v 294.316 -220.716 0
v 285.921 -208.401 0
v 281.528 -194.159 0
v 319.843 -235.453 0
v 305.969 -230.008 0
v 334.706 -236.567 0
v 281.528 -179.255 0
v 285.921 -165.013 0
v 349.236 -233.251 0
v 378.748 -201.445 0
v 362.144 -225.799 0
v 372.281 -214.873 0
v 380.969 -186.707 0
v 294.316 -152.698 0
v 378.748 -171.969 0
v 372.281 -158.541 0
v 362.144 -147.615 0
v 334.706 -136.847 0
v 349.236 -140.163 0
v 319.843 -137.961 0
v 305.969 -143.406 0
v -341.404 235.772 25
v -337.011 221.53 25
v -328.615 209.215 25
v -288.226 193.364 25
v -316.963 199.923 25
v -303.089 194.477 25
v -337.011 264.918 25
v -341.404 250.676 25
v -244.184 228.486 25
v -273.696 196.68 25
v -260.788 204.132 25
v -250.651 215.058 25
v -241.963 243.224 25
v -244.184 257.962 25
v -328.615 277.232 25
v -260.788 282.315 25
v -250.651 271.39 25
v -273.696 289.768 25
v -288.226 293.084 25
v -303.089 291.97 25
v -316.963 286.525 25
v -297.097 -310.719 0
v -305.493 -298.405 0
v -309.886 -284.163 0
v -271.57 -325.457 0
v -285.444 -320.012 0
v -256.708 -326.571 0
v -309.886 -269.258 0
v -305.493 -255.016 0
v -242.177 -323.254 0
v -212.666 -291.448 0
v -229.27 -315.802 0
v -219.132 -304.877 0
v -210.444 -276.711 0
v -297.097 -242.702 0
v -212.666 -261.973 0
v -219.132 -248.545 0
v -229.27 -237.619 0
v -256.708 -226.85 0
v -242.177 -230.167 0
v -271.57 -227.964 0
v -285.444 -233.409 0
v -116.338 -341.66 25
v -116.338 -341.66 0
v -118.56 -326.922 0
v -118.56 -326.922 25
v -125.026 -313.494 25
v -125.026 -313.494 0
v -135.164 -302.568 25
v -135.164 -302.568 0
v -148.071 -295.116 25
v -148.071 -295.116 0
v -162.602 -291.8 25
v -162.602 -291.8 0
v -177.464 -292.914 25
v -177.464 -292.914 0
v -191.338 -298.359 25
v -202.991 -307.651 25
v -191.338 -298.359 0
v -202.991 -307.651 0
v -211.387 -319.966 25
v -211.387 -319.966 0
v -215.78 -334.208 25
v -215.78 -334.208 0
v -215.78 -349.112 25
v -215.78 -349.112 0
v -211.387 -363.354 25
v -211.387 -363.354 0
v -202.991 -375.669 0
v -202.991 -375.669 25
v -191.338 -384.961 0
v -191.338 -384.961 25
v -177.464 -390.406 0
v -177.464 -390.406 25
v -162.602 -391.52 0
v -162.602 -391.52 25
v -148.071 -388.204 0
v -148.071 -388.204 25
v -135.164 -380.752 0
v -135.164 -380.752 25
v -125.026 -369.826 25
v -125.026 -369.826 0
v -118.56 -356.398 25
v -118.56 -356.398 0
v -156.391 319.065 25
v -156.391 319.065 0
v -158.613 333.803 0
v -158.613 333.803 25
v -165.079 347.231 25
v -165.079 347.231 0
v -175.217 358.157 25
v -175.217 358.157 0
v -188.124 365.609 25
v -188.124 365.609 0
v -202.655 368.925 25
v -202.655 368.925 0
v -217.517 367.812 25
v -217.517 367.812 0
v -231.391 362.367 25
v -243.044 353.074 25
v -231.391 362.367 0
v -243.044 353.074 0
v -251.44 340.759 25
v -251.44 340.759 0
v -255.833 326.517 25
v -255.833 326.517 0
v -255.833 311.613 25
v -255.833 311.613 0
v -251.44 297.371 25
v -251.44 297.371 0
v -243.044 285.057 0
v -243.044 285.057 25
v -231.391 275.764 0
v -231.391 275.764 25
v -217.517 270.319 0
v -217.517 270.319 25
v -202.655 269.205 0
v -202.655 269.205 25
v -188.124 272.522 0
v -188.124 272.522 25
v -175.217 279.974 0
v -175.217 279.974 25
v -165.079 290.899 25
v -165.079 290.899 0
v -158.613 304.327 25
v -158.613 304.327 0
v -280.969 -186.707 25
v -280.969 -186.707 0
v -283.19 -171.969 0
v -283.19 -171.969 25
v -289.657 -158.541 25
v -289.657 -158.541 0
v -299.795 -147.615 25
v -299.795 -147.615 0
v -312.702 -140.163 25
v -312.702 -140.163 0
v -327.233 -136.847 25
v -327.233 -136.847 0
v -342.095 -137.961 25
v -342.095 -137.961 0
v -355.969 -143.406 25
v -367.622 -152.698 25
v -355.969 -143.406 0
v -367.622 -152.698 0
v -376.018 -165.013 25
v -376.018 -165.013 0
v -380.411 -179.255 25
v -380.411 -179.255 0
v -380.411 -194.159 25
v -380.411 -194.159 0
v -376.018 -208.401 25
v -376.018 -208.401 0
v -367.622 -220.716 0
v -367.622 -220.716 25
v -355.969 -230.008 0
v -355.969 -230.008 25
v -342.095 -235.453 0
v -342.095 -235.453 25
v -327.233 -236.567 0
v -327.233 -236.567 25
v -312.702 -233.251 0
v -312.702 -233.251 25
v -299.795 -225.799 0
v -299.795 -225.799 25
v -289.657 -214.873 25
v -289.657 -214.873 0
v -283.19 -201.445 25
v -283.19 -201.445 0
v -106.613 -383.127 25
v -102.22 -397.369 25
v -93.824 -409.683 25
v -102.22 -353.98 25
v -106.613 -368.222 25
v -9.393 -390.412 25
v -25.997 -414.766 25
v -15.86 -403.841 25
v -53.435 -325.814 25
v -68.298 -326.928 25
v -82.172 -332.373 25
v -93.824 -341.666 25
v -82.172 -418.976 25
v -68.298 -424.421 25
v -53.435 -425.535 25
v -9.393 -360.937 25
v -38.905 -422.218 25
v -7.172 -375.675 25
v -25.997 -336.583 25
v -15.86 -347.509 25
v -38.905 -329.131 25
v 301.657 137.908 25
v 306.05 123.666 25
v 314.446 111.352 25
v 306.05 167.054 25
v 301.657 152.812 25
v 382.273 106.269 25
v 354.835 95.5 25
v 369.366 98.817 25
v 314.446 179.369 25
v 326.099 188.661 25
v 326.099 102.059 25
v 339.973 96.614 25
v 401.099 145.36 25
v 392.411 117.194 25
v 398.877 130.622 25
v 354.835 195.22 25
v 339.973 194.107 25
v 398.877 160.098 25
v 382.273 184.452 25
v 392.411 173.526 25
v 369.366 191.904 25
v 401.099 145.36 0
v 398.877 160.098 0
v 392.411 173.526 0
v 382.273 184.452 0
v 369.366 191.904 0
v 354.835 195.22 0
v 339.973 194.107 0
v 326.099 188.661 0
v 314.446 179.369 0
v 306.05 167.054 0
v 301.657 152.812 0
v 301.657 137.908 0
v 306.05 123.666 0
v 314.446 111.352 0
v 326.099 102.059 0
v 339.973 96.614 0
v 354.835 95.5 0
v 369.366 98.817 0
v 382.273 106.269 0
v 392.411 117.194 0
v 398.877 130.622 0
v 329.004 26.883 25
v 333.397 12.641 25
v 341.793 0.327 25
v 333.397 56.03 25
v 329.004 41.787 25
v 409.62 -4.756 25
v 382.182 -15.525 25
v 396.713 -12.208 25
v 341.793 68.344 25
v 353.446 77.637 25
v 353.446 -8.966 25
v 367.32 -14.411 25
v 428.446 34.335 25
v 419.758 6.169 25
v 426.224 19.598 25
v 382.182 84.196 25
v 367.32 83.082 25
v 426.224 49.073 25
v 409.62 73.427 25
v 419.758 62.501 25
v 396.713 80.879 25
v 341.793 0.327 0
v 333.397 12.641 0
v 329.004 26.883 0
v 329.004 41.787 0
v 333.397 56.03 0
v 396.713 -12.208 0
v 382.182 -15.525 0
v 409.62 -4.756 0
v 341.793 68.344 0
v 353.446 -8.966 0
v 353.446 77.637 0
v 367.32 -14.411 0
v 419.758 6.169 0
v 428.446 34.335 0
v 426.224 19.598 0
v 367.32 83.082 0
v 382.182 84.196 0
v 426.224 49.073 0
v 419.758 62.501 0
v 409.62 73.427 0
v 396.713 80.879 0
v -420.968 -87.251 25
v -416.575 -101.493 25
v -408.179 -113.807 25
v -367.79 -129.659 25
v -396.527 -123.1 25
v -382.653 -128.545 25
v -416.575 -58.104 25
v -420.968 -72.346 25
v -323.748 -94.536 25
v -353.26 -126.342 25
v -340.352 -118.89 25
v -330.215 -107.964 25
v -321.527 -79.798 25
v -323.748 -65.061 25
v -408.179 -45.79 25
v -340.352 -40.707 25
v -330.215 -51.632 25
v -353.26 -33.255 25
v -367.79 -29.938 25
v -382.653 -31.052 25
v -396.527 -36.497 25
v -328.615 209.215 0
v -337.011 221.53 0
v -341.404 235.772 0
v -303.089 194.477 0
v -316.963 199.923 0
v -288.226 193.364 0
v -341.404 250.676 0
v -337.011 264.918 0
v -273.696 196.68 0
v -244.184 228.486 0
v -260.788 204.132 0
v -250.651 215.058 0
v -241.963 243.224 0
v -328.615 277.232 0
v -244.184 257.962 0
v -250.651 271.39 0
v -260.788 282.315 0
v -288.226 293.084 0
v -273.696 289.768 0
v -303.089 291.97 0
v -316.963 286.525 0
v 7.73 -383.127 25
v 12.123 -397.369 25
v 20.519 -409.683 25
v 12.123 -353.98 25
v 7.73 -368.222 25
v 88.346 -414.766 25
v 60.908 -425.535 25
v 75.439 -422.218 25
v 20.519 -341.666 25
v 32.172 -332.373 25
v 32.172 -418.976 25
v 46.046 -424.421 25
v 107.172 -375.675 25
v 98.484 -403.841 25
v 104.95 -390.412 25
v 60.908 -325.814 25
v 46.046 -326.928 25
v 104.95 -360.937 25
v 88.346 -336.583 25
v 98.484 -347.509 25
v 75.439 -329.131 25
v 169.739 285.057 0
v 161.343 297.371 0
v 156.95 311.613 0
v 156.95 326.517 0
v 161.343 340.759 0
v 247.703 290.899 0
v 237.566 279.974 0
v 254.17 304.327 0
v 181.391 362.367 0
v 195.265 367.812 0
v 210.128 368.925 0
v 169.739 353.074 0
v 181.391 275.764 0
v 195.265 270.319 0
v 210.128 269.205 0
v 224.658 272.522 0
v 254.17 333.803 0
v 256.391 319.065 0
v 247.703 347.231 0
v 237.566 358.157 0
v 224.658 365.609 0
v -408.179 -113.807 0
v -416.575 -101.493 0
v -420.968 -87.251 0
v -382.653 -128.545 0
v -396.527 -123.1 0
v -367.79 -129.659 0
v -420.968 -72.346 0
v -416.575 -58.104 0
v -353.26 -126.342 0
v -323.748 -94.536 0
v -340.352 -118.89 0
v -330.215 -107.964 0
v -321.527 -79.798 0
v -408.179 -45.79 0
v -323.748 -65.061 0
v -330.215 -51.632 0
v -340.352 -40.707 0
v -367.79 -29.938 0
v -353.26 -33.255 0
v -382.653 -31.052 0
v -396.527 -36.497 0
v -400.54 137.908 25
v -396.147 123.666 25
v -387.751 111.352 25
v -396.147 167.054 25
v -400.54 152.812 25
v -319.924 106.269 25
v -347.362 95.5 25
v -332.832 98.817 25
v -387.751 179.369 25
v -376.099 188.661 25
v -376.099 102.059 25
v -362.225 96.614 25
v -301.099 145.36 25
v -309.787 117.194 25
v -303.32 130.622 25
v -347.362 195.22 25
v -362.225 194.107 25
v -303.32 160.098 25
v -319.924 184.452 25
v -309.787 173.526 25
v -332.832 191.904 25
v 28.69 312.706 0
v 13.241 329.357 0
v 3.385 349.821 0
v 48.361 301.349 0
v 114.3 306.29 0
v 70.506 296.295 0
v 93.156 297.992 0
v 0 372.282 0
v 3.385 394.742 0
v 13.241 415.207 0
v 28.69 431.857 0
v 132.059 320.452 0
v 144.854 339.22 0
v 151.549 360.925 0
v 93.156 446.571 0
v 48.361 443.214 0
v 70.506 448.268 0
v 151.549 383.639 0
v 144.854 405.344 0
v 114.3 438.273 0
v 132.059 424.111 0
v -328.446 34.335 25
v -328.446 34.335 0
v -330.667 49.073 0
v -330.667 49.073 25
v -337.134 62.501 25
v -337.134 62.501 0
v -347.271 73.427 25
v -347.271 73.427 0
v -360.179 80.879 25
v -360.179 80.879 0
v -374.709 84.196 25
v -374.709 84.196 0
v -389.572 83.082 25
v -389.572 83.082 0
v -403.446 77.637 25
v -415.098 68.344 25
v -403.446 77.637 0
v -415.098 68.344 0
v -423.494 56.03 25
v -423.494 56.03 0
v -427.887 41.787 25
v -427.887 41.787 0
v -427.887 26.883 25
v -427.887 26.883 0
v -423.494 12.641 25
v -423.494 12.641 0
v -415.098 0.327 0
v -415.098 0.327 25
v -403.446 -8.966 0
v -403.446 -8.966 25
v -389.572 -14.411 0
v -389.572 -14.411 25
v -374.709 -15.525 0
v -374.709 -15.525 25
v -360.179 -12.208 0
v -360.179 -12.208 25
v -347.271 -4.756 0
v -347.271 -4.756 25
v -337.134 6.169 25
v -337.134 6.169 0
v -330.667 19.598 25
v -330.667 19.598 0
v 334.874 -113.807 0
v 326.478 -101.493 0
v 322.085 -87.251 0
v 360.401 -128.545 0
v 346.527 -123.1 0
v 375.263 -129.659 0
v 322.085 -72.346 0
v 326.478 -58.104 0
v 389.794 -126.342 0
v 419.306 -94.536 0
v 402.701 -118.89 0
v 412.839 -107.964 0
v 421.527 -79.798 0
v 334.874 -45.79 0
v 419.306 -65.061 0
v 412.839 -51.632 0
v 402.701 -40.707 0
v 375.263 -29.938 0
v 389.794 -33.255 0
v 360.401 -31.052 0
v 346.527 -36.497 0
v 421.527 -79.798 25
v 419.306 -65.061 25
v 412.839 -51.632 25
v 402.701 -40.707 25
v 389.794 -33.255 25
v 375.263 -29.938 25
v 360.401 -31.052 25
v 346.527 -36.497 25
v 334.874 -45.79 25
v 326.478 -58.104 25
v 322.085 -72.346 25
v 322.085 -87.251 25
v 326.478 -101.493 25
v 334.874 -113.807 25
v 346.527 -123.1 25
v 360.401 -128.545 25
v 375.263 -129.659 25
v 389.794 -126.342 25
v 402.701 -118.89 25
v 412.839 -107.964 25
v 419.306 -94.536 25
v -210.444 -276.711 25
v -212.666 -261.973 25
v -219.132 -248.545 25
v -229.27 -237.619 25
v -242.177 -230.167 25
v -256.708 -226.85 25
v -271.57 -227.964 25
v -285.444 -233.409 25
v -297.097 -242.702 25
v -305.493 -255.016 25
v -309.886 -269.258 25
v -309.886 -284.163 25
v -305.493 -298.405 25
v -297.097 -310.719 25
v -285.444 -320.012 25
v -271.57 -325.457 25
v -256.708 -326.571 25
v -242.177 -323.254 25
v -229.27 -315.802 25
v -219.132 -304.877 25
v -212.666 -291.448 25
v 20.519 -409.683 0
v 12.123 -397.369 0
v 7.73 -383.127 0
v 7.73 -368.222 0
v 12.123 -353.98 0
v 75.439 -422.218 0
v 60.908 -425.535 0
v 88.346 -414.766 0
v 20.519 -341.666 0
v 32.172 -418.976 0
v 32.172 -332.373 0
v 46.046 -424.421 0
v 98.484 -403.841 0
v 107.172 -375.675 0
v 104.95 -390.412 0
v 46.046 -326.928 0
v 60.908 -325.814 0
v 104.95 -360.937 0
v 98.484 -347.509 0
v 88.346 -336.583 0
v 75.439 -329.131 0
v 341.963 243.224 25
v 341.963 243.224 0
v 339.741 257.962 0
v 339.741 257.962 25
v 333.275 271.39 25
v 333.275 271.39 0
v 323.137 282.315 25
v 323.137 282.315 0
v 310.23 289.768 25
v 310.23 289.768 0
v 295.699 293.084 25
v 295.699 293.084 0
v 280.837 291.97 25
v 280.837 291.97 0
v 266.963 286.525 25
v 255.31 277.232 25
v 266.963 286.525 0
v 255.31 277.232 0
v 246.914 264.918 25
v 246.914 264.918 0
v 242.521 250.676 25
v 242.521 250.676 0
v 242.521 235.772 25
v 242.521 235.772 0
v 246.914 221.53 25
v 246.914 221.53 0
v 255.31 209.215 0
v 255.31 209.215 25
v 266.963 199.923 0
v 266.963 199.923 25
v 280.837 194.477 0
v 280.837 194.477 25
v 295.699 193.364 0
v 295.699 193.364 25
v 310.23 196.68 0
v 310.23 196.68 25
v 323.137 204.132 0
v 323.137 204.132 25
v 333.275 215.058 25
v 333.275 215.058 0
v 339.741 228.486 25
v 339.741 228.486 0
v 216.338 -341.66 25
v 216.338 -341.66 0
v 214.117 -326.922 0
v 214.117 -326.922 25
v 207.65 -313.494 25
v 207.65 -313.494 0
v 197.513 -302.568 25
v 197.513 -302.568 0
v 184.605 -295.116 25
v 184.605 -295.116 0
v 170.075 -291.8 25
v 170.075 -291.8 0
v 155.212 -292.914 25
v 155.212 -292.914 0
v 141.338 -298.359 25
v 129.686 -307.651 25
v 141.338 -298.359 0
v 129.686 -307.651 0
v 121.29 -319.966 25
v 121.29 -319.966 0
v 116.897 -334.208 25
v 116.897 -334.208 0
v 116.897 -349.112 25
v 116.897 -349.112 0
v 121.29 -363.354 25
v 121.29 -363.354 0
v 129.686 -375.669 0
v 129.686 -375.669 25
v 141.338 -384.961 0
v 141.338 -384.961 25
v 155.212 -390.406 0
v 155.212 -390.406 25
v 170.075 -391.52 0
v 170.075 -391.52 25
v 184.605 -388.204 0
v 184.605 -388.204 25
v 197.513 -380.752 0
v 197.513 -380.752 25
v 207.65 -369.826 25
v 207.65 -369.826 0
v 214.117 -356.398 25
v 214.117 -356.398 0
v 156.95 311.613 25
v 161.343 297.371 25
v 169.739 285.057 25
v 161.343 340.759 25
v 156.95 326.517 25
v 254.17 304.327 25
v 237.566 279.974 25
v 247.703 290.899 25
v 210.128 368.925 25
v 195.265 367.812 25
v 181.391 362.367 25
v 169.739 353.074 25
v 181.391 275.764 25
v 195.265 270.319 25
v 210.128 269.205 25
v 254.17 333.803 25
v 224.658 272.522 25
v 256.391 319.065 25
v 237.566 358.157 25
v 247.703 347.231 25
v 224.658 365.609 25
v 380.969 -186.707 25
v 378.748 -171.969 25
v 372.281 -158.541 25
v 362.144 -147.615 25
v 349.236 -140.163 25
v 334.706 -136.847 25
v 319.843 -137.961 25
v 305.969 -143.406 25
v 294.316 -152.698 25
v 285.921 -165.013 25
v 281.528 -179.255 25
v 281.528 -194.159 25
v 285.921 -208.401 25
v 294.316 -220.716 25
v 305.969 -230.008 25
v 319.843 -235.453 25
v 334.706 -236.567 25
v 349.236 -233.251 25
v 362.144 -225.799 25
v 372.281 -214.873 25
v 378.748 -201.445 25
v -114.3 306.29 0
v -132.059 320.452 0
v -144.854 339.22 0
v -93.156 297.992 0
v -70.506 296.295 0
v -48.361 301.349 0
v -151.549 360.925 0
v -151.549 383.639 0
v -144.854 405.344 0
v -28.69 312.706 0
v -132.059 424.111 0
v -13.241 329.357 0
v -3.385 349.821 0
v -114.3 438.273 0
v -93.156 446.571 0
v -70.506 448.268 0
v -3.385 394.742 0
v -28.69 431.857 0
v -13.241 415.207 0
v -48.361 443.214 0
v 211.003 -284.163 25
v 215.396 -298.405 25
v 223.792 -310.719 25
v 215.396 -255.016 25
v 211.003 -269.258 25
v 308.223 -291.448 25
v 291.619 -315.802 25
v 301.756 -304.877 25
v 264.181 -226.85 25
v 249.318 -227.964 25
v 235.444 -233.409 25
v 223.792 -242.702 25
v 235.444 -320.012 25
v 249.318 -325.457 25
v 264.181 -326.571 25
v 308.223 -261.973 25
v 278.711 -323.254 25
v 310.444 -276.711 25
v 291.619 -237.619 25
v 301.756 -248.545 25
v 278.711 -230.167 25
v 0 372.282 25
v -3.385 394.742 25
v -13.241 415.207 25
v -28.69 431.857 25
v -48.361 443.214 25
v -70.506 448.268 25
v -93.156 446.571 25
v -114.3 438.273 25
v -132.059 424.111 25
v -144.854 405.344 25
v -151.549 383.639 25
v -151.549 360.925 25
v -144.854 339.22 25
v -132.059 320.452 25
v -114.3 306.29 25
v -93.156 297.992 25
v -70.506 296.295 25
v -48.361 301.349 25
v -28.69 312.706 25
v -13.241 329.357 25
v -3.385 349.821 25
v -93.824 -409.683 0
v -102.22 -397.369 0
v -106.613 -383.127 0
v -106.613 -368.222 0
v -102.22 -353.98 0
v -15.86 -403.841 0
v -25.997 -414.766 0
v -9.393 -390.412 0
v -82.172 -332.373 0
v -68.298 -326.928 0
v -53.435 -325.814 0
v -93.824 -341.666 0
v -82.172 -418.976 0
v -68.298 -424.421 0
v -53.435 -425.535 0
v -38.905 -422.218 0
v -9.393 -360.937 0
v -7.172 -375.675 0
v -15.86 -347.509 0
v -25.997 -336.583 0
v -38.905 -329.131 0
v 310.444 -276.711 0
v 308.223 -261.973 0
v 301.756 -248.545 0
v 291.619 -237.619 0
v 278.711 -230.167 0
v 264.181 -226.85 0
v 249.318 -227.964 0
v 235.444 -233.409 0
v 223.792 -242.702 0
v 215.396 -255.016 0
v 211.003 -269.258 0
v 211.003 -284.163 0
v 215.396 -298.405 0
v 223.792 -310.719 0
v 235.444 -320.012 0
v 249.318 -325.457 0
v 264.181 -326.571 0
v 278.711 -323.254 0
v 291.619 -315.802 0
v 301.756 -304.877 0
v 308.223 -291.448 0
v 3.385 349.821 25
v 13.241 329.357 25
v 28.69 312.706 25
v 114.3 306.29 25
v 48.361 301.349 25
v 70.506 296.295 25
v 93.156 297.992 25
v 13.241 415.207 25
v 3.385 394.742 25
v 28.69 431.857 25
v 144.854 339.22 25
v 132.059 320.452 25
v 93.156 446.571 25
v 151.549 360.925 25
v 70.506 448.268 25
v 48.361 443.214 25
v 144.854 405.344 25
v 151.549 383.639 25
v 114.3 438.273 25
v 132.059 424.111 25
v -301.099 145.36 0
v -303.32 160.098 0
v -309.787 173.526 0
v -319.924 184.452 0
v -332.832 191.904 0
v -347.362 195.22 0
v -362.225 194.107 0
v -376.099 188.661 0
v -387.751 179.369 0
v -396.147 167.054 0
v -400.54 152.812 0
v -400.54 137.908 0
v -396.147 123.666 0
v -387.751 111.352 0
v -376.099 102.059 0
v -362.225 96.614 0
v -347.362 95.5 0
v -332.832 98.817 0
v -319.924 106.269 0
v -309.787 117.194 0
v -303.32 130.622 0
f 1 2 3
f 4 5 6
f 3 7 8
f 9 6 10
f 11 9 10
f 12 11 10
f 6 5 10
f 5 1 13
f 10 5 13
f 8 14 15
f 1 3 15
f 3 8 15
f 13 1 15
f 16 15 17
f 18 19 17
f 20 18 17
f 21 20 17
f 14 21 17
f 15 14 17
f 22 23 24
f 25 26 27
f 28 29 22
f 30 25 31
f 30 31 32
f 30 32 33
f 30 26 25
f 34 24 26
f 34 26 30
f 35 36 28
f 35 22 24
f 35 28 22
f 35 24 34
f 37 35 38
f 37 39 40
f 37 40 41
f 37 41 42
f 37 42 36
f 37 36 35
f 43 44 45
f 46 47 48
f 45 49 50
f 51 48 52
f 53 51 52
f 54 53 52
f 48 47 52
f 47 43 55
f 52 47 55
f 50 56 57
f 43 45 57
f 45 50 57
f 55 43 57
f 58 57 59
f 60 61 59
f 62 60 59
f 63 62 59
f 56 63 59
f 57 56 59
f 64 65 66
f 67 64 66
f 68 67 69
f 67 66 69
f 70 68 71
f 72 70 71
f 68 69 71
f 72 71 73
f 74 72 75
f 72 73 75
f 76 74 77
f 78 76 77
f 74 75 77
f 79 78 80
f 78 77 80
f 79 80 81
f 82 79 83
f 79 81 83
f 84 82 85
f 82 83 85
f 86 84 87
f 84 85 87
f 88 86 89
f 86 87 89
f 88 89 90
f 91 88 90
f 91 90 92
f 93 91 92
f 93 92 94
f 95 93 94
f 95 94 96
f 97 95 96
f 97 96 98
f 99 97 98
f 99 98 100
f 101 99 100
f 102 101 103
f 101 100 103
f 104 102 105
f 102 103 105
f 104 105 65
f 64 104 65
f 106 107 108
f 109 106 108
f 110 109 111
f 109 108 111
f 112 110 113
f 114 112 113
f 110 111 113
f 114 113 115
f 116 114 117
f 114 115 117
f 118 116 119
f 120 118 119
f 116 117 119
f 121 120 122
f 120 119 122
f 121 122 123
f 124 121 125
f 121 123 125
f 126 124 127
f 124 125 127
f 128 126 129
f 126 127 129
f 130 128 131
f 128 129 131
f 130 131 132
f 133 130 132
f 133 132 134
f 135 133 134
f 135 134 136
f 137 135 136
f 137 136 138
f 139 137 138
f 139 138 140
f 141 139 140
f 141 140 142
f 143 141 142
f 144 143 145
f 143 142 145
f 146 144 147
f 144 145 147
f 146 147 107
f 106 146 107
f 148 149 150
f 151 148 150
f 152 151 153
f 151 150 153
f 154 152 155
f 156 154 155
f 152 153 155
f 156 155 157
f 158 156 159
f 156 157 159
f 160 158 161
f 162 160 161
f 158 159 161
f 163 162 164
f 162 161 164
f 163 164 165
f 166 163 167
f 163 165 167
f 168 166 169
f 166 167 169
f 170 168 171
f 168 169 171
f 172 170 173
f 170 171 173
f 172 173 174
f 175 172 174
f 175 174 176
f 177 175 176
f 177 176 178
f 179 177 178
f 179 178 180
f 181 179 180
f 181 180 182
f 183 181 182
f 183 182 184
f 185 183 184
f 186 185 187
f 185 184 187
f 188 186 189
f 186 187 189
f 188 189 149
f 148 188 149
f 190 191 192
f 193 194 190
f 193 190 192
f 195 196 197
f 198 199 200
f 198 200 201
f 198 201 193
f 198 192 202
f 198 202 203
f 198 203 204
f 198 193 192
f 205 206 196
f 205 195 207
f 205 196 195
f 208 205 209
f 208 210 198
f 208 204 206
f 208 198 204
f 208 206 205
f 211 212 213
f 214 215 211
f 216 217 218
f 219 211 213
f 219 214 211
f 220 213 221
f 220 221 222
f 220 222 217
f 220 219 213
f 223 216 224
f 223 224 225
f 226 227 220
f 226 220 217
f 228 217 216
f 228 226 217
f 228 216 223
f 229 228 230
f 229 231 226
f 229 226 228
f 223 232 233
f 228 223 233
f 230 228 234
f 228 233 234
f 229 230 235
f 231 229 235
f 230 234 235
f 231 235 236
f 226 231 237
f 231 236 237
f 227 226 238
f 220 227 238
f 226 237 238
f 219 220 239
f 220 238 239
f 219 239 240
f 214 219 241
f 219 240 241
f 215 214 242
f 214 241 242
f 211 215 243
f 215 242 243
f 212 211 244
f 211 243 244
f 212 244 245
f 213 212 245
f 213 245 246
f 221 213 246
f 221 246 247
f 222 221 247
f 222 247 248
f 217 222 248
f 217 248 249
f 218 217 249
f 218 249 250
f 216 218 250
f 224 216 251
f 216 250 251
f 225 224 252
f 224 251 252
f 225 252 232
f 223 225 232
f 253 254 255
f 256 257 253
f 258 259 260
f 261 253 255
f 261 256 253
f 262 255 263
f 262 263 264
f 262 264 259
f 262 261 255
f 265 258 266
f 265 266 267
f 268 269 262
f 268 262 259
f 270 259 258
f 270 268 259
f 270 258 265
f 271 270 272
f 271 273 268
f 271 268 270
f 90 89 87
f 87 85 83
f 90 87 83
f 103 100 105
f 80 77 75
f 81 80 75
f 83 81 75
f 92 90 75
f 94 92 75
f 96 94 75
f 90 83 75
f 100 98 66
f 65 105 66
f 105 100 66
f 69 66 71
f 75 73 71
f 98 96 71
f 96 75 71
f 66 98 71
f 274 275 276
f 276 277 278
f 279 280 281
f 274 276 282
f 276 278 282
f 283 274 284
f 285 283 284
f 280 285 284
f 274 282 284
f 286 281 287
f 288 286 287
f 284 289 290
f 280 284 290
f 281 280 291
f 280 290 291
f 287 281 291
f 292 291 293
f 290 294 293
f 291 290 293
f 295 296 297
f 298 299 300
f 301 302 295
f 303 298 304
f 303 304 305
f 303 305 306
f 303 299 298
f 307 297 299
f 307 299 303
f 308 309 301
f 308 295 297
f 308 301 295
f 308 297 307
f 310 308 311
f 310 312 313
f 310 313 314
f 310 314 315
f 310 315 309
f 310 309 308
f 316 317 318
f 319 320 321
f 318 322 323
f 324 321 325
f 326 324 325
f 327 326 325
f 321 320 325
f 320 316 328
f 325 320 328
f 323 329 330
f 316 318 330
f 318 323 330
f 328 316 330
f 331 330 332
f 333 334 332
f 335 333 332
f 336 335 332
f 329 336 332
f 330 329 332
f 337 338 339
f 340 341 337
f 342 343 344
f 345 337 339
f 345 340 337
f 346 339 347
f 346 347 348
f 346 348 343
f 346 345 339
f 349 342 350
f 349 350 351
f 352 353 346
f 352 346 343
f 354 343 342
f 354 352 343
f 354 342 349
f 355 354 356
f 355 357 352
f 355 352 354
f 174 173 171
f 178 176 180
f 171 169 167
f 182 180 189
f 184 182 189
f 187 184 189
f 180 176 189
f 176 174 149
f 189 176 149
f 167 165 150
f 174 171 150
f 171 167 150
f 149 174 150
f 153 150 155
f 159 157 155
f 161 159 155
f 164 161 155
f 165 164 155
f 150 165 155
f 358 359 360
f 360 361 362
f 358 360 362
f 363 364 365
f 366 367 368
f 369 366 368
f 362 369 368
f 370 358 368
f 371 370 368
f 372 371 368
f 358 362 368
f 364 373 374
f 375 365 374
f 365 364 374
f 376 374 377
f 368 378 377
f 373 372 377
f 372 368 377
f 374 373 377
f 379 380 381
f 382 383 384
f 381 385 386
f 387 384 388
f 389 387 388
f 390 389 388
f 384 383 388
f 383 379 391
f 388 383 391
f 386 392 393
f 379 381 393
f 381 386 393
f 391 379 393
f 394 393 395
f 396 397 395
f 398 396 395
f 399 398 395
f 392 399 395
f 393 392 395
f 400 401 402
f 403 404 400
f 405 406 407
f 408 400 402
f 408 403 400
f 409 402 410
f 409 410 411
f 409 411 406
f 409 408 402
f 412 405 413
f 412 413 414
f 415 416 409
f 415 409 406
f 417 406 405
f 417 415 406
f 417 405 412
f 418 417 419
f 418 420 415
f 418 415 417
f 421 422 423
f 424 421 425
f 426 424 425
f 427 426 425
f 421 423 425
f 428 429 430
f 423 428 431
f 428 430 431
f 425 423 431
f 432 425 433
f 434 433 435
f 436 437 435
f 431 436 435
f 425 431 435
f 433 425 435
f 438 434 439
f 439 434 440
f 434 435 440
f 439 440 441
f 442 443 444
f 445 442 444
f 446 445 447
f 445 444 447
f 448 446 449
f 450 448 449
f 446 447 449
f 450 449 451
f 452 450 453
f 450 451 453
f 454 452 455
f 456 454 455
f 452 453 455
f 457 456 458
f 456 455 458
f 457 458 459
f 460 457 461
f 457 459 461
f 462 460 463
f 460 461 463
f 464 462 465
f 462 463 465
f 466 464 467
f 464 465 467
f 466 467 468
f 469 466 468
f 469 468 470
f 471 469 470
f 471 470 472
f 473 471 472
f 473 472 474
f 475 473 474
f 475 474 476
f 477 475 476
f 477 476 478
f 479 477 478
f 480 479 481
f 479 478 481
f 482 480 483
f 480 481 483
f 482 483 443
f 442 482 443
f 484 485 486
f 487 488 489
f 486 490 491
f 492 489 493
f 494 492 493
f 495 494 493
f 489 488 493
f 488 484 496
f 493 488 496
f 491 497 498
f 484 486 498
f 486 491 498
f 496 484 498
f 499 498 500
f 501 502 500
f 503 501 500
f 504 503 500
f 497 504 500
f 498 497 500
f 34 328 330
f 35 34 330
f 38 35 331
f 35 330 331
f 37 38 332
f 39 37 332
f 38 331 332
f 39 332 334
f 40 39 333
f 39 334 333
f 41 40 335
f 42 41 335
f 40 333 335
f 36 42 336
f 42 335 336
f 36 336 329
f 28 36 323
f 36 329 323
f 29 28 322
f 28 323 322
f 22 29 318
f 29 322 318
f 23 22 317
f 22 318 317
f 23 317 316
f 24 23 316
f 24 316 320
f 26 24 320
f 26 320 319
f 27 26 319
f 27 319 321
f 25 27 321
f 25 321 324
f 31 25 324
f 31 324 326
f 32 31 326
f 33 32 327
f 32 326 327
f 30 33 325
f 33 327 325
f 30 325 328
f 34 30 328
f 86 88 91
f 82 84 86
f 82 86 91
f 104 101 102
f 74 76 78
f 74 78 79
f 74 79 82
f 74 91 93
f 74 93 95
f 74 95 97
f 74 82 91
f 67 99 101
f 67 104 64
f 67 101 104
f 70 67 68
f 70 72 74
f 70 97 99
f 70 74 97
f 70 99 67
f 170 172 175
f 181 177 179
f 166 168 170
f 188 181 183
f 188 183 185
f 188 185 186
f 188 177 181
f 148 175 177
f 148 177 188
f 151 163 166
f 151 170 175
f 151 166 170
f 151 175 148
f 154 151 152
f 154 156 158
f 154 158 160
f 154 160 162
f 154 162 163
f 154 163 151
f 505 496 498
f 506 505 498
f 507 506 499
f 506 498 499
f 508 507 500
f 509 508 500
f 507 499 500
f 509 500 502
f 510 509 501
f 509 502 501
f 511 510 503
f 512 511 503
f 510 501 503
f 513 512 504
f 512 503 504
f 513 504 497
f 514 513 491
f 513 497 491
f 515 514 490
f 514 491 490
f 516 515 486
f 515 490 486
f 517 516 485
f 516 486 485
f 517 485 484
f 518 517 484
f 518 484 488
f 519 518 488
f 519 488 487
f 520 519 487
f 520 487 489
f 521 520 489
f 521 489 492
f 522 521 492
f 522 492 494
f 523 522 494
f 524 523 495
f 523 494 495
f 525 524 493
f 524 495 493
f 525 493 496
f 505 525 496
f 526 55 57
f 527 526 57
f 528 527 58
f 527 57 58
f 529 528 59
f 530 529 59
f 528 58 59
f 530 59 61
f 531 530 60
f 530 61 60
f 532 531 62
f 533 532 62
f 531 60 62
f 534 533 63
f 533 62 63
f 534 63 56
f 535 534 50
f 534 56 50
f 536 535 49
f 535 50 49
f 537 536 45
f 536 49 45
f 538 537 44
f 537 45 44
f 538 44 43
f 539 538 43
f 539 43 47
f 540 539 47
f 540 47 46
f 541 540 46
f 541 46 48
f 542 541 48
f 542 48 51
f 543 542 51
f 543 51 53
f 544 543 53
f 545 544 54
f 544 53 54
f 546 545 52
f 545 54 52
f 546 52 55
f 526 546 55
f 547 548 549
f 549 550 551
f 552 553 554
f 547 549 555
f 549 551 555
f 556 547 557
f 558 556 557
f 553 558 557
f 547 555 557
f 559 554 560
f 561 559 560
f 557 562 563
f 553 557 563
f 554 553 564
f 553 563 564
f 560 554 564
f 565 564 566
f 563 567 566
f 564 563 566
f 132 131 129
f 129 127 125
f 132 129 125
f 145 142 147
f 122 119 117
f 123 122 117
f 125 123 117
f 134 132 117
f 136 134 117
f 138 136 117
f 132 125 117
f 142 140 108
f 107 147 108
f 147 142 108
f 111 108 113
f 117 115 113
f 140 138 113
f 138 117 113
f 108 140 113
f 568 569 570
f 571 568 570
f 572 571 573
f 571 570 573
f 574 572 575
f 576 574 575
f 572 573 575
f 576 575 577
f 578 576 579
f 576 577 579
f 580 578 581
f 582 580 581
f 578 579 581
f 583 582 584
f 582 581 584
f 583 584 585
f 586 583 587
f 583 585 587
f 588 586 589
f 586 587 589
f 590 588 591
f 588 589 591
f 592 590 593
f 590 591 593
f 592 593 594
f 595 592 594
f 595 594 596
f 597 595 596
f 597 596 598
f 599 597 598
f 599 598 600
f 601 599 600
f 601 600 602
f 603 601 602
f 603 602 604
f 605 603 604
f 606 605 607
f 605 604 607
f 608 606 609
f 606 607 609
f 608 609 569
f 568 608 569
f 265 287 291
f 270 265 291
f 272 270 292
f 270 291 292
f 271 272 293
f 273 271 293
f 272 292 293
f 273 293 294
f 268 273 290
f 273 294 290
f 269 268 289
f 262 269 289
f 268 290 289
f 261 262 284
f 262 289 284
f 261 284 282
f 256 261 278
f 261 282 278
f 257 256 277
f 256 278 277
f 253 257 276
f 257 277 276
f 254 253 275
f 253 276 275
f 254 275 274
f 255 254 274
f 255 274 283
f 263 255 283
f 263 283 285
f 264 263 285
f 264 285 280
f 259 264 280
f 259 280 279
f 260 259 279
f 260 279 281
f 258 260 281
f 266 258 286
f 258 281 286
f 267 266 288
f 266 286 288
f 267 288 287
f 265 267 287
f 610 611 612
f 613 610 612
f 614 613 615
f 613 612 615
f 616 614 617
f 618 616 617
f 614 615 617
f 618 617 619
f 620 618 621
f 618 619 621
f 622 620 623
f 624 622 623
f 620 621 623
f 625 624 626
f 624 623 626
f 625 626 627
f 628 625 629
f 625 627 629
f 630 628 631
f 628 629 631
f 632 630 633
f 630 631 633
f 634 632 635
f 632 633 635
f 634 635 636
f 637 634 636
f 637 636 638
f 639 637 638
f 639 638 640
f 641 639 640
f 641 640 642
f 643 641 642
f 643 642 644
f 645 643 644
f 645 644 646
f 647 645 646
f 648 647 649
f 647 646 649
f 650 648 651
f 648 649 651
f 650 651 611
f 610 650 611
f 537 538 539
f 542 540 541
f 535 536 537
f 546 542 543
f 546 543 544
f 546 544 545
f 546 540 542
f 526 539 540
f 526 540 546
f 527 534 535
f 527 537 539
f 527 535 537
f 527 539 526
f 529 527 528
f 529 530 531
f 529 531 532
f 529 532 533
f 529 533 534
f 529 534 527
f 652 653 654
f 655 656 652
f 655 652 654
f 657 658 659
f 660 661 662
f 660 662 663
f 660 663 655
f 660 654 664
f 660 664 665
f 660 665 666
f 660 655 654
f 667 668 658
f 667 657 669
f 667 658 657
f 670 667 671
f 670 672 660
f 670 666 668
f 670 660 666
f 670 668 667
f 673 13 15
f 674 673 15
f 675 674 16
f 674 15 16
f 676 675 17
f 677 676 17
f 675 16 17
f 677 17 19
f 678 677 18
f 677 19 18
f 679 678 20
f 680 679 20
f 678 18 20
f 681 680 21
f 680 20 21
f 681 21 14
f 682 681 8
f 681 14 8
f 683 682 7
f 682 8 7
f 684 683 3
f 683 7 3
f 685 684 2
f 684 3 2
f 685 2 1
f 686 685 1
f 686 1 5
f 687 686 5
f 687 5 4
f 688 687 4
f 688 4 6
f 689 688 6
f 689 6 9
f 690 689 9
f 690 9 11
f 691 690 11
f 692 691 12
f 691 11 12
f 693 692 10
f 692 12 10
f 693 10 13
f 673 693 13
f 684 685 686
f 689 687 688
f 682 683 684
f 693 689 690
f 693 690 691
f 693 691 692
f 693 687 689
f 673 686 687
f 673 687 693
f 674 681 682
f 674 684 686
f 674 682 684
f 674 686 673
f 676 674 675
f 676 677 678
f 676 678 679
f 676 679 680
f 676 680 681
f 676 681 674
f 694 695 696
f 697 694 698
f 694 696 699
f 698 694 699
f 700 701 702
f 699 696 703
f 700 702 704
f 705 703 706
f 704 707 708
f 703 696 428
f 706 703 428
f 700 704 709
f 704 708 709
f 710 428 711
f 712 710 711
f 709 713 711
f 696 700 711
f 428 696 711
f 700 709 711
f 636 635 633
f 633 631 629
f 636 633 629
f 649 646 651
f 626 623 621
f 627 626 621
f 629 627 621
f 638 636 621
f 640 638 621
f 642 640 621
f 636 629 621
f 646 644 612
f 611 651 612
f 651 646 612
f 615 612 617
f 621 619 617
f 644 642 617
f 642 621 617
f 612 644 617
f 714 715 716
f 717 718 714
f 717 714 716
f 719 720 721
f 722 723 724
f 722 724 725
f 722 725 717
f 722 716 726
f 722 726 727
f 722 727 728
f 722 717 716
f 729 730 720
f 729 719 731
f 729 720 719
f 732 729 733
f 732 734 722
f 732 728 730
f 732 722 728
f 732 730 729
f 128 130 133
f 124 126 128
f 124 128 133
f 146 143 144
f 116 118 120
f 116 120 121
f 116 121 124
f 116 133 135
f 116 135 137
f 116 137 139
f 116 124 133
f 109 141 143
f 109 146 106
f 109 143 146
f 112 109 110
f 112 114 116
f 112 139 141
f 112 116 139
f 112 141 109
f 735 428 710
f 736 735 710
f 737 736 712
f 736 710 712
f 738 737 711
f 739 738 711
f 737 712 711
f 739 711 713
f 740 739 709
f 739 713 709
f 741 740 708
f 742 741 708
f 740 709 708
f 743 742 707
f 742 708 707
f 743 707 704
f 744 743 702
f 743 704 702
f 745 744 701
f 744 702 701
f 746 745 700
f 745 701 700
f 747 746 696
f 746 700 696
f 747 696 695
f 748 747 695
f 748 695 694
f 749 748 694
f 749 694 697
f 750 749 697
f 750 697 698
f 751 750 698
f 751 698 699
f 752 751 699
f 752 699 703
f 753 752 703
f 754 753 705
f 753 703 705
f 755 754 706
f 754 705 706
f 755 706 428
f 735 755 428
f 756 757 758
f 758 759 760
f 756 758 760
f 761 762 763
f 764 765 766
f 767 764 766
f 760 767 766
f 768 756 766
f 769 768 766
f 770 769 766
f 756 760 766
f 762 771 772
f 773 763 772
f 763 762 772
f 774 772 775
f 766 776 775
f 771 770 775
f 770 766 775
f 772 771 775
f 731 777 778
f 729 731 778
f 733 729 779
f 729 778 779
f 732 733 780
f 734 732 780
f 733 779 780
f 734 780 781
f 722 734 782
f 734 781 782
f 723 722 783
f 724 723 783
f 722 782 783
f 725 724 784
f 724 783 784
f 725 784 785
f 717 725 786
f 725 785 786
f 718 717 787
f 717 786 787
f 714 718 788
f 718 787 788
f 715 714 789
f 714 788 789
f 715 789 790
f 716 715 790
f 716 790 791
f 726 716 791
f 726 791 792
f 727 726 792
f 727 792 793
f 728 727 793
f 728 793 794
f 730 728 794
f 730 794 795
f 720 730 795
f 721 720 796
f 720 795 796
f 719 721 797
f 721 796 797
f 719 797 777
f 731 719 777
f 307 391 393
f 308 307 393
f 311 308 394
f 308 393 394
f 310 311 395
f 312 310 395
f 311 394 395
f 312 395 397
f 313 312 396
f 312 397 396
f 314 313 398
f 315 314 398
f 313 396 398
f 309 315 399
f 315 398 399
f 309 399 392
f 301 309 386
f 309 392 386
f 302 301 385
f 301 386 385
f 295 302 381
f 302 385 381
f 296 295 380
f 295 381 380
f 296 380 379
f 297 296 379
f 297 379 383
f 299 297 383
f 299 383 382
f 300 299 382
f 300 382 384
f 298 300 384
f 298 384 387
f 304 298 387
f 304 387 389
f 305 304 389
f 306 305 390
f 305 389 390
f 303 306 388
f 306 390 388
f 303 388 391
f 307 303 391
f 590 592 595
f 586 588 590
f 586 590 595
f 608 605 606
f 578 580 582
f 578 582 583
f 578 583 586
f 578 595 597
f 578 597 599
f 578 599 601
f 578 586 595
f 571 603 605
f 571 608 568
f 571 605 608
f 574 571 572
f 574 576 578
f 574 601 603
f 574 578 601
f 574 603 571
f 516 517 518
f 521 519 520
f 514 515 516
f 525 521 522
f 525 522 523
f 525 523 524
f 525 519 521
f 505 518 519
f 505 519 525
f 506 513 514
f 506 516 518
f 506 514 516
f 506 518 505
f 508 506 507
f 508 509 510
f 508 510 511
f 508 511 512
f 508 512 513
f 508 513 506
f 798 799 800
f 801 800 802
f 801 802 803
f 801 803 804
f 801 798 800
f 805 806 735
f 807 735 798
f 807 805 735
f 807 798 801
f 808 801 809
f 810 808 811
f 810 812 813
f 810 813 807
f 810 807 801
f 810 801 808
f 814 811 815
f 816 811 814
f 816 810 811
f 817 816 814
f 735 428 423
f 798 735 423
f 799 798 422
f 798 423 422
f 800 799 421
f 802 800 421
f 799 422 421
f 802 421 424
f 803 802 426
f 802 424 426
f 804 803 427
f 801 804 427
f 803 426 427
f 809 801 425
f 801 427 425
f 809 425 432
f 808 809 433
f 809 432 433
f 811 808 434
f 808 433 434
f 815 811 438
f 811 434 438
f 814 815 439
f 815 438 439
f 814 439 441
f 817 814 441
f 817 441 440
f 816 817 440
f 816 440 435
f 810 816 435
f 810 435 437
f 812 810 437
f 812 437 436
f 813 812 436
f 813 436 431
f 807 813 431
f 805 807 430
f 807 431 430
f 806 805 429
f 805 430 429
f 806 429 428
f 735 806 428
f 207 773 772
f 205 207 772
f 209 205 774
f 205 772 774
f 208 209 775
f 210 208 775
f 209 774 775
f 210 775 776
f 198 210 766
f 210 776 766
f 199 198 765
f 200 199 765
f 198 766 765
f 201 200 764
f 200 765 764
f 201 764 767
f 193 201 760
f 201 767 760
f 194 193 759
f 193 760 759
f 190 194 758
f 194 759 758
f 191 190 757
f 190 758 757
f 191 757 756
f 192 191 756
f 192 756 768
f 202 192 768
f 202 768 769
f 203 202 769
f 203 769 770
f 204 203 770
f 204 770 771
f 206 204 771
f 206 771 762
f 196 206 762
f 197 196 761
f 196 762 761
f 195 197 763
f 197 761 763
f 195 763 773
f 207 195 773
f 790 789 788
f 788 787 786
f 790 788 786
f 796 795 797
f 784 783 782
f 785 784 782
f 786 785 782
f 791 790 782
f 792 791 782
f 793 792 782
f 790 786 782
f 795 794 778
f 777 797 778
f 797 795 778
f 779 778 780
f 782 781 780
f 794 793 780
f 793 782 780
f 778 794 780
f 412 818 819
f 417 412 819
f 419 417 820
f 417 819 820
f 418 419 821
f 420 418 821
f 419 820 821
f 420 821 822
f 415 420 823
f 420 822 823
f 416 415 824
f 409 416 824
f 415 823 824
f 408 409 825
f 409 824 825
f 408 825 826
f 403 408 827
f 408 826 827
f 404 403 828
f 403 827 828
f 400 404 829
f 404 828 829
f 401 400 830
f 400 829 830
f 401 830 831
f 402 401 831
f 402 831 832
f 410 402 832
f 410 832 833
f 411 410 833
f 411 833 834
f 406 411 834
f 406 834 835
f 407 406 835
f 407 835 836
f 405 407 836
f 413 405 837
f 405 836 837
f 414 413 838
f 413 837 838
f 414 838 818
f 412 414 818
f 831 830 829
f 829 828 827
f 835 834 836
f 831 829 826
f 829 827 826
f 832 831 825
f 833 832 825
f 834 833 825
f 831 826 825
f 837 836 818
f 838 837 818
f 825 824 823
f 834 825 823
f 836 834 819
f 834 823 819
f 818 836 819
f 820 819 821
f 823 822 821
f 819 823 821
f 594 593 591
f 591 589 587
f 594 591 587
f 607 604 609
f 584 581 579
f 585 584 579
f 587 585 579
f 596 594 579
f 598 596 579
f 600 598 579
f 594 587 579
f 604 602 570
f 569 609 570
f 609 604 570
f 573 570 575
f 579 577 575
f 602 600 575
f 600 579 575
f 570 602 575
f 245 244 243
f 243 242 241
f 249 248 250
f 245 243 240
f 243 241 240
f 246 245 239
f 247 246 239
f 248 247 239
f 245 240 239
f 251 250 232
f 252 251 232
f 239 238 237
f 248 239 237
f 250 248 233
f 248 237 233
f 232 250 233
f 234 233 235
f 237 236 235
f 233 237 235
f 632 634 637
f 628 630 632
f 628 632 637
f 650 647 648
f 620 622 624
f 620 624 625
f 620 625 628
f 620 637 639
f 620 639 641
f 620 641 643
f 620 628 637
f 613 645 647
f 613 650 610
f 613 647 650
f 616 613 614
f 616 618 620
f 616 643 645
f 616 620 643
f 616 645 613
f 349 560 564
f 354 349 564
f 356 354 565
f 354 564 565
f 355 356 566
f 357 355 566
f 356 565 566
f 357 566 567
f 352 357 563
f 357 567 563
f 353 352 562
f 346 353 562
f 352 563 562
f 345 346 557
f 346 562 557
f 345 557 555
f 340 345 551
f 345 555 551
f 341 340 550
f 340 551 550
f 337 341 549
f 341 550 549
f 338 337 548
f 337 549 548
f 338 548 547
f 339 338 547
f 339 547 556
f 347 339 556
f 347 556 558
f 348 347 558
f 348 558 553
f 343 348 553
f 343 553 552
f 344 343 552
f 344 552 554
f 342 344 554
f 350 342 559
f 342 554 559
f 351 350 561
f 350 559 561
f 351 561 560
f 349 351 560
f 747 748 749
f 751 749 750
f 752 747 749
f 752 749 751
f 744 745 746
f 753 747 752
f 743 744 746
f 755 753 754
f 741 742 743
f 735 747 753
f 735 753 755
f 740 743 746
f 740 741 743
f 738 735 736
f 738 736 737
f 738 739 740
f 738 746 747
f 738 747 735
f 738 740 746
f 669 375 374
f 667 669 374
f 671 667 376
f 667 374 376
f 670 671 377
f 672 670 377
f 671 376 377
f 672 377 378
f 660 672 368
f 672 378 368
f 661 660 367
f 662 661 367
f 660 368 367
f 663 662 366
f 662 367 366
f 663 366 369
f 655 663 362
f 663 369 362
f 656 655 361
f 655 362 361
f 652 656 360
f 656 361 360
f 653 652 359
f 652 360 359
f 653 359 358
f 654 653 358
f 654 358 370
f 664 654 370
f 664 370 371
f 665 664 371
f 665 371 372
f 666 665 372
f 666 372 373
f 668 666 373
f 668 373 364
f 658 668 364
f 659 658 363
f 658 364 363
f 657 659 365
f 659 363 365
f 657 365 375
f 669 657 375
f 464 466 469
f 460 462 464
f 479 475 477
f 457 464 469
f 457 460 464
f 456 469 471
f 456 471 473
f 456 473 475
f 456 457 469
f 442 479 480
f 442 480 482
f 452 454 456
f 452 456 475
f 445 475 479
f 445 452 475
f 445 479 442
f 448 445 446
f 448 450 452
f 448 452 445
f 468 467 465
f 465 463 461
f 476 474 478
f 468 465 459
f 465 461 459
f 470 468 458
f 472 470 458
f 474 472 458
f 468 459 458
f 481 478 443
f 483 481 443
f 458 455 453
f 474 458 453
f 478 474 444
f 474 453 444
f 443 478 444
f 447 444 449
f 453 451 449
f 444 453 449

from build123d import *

# Parameters (mm, degrees)
F0_R     = 76.2
F0_R_2   = 50
F1_DEPTH = 25


with BuildPart() as f1:
    # F0 (on Top) → F1 (new body)
    with BuildSketch(Plane.XY):
        with Locations((-76.2, 372.28156)):
            Circle(F0_R)
        with BuildLine():
            ThreePointArc((152.4, 372.28156), (76.2, 448.48156), (0, 372.28156))
            ThreePointArc((0, 372.28156), (76.2, 296.08156), (152.4, 372.28156))
        make_face()
        with Locations((-206.391301, 319.065246)):
            Circle(F0_R_2)
        with Locations((-291.962628, 243.223815)):
            Circle(F0_R_2)
        with Locations((-351.098852, 145.360228)):
            Circle(F0_R_2)
        with Locations((-378.445618, 34.335326)):
            Circle(F0_R_2)
        with Locations((-371.526872, -79.798392)):
            Circle(F0_R_2)
        with Locations((-330.969058, -186.706943)):
            Circle(F0_R_2)
        with Locations((-260.444392, -276.710533)):
            Circle(F0_R_2)
        with Locations((-166.338371, -341.659986)):
            Circle(F0_R_2)
        with Locations((-57.171616, -375.674602)):
            Circle(F0_R_2)
        with Locations((57.171616, -375.674602)):
            Circle(F0_R_2)
        with Locations((166.338371, -341.659986)):
            Circle(F0_R_2)
        with Locations((260.444392, -276.710533)):
            Circle(F0_R_2)
        with Locations((330.969058, -186.706943)):
            Circle(F0_R_2)
        with Locations((371.526872, -79.798392)):
            Circle(F0_R_2)
        with Locations((378.445618, 34.335326)):
            Circle(F0_R_2)
        with Locations((351.098852, 145.360228)):
            Circle(F0_R_2)
        with Locations((291.962628, 243.223815)):
            Circle(F0_R_2)
        with Locations((206.391301, 319.065246)):
            Circle(F0_R_2)
    extrude(amount=F1_DEPTH)


solid = f1.part
